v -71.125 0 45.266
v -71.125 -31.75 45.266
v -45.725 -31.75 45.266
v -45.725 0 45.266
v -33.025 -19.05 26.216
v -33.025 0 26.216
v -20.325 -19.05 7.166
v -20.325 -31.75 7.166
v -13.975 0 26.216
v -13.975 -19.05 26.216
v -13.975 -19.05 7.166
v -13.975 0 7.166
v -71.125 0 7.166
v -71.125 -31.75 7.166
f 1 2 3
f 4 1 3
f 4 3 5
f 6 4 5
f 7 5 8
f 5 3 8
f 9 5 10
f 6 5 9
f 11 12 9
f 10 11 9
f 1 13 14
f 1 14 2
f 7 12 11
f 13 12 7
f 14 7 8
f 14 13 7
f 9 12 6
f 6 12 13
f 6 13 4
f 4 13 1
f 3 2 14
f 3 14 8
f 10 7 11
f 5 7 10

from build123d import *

# Parameters (mm, degrees)
F0_W     = 50.8
F0_H     = 38.1
F1_DEPTH = 31.75
F3_DEPTH = 12.7
F5_DEPTH = 25.4
F6_DEPTH = 6.35


with BuildPart() as f1:
    # F0 (on Front) → F1 (new body)
    with BuildSketch(Plane.XZ):
        with Locations((-45.7247960726, 26.2155969156)):
            Rectangle(F0_W, F0_H)
    extrude(amount=F1_DEPTH)

    # F2 (on face) → F3 (cut)
    with BuildSketch(Plane.XZ.offset(31.75)):
        Polygon((-45.7247960726, 45.2655969156), (-20.3247960726, 7.1655969156), (-20.3247960726, 45.2655969156), align=None)
    extrude(amount=-F3_DEPTH, mode=Mode.SUBTRACT)

    # F4 (on face) → F5 (cut)
    with BuildSketch(Plane.XZ.offset(19.05)):
        Polygon((-45.7247960726, 45.2655969156), (-33.0247960726, 26.2155969156), (-20.3247960726, 26.2155969156), (-20.3247960726, 45.2655969156), align=None)
    extrude(amount=-F5_DEPTH, mode=Mode.SUBTRACT)

    # F6 (add): a face of the model
    f6_faces = [f1.faces().sort_by_distance(p)[0] for p in [
        (-20.3247960726, -9.525, 16.6905969156),
    ]]
    extrude(f6_faces, amount=F6_DEPTH)


solid = f1.part
